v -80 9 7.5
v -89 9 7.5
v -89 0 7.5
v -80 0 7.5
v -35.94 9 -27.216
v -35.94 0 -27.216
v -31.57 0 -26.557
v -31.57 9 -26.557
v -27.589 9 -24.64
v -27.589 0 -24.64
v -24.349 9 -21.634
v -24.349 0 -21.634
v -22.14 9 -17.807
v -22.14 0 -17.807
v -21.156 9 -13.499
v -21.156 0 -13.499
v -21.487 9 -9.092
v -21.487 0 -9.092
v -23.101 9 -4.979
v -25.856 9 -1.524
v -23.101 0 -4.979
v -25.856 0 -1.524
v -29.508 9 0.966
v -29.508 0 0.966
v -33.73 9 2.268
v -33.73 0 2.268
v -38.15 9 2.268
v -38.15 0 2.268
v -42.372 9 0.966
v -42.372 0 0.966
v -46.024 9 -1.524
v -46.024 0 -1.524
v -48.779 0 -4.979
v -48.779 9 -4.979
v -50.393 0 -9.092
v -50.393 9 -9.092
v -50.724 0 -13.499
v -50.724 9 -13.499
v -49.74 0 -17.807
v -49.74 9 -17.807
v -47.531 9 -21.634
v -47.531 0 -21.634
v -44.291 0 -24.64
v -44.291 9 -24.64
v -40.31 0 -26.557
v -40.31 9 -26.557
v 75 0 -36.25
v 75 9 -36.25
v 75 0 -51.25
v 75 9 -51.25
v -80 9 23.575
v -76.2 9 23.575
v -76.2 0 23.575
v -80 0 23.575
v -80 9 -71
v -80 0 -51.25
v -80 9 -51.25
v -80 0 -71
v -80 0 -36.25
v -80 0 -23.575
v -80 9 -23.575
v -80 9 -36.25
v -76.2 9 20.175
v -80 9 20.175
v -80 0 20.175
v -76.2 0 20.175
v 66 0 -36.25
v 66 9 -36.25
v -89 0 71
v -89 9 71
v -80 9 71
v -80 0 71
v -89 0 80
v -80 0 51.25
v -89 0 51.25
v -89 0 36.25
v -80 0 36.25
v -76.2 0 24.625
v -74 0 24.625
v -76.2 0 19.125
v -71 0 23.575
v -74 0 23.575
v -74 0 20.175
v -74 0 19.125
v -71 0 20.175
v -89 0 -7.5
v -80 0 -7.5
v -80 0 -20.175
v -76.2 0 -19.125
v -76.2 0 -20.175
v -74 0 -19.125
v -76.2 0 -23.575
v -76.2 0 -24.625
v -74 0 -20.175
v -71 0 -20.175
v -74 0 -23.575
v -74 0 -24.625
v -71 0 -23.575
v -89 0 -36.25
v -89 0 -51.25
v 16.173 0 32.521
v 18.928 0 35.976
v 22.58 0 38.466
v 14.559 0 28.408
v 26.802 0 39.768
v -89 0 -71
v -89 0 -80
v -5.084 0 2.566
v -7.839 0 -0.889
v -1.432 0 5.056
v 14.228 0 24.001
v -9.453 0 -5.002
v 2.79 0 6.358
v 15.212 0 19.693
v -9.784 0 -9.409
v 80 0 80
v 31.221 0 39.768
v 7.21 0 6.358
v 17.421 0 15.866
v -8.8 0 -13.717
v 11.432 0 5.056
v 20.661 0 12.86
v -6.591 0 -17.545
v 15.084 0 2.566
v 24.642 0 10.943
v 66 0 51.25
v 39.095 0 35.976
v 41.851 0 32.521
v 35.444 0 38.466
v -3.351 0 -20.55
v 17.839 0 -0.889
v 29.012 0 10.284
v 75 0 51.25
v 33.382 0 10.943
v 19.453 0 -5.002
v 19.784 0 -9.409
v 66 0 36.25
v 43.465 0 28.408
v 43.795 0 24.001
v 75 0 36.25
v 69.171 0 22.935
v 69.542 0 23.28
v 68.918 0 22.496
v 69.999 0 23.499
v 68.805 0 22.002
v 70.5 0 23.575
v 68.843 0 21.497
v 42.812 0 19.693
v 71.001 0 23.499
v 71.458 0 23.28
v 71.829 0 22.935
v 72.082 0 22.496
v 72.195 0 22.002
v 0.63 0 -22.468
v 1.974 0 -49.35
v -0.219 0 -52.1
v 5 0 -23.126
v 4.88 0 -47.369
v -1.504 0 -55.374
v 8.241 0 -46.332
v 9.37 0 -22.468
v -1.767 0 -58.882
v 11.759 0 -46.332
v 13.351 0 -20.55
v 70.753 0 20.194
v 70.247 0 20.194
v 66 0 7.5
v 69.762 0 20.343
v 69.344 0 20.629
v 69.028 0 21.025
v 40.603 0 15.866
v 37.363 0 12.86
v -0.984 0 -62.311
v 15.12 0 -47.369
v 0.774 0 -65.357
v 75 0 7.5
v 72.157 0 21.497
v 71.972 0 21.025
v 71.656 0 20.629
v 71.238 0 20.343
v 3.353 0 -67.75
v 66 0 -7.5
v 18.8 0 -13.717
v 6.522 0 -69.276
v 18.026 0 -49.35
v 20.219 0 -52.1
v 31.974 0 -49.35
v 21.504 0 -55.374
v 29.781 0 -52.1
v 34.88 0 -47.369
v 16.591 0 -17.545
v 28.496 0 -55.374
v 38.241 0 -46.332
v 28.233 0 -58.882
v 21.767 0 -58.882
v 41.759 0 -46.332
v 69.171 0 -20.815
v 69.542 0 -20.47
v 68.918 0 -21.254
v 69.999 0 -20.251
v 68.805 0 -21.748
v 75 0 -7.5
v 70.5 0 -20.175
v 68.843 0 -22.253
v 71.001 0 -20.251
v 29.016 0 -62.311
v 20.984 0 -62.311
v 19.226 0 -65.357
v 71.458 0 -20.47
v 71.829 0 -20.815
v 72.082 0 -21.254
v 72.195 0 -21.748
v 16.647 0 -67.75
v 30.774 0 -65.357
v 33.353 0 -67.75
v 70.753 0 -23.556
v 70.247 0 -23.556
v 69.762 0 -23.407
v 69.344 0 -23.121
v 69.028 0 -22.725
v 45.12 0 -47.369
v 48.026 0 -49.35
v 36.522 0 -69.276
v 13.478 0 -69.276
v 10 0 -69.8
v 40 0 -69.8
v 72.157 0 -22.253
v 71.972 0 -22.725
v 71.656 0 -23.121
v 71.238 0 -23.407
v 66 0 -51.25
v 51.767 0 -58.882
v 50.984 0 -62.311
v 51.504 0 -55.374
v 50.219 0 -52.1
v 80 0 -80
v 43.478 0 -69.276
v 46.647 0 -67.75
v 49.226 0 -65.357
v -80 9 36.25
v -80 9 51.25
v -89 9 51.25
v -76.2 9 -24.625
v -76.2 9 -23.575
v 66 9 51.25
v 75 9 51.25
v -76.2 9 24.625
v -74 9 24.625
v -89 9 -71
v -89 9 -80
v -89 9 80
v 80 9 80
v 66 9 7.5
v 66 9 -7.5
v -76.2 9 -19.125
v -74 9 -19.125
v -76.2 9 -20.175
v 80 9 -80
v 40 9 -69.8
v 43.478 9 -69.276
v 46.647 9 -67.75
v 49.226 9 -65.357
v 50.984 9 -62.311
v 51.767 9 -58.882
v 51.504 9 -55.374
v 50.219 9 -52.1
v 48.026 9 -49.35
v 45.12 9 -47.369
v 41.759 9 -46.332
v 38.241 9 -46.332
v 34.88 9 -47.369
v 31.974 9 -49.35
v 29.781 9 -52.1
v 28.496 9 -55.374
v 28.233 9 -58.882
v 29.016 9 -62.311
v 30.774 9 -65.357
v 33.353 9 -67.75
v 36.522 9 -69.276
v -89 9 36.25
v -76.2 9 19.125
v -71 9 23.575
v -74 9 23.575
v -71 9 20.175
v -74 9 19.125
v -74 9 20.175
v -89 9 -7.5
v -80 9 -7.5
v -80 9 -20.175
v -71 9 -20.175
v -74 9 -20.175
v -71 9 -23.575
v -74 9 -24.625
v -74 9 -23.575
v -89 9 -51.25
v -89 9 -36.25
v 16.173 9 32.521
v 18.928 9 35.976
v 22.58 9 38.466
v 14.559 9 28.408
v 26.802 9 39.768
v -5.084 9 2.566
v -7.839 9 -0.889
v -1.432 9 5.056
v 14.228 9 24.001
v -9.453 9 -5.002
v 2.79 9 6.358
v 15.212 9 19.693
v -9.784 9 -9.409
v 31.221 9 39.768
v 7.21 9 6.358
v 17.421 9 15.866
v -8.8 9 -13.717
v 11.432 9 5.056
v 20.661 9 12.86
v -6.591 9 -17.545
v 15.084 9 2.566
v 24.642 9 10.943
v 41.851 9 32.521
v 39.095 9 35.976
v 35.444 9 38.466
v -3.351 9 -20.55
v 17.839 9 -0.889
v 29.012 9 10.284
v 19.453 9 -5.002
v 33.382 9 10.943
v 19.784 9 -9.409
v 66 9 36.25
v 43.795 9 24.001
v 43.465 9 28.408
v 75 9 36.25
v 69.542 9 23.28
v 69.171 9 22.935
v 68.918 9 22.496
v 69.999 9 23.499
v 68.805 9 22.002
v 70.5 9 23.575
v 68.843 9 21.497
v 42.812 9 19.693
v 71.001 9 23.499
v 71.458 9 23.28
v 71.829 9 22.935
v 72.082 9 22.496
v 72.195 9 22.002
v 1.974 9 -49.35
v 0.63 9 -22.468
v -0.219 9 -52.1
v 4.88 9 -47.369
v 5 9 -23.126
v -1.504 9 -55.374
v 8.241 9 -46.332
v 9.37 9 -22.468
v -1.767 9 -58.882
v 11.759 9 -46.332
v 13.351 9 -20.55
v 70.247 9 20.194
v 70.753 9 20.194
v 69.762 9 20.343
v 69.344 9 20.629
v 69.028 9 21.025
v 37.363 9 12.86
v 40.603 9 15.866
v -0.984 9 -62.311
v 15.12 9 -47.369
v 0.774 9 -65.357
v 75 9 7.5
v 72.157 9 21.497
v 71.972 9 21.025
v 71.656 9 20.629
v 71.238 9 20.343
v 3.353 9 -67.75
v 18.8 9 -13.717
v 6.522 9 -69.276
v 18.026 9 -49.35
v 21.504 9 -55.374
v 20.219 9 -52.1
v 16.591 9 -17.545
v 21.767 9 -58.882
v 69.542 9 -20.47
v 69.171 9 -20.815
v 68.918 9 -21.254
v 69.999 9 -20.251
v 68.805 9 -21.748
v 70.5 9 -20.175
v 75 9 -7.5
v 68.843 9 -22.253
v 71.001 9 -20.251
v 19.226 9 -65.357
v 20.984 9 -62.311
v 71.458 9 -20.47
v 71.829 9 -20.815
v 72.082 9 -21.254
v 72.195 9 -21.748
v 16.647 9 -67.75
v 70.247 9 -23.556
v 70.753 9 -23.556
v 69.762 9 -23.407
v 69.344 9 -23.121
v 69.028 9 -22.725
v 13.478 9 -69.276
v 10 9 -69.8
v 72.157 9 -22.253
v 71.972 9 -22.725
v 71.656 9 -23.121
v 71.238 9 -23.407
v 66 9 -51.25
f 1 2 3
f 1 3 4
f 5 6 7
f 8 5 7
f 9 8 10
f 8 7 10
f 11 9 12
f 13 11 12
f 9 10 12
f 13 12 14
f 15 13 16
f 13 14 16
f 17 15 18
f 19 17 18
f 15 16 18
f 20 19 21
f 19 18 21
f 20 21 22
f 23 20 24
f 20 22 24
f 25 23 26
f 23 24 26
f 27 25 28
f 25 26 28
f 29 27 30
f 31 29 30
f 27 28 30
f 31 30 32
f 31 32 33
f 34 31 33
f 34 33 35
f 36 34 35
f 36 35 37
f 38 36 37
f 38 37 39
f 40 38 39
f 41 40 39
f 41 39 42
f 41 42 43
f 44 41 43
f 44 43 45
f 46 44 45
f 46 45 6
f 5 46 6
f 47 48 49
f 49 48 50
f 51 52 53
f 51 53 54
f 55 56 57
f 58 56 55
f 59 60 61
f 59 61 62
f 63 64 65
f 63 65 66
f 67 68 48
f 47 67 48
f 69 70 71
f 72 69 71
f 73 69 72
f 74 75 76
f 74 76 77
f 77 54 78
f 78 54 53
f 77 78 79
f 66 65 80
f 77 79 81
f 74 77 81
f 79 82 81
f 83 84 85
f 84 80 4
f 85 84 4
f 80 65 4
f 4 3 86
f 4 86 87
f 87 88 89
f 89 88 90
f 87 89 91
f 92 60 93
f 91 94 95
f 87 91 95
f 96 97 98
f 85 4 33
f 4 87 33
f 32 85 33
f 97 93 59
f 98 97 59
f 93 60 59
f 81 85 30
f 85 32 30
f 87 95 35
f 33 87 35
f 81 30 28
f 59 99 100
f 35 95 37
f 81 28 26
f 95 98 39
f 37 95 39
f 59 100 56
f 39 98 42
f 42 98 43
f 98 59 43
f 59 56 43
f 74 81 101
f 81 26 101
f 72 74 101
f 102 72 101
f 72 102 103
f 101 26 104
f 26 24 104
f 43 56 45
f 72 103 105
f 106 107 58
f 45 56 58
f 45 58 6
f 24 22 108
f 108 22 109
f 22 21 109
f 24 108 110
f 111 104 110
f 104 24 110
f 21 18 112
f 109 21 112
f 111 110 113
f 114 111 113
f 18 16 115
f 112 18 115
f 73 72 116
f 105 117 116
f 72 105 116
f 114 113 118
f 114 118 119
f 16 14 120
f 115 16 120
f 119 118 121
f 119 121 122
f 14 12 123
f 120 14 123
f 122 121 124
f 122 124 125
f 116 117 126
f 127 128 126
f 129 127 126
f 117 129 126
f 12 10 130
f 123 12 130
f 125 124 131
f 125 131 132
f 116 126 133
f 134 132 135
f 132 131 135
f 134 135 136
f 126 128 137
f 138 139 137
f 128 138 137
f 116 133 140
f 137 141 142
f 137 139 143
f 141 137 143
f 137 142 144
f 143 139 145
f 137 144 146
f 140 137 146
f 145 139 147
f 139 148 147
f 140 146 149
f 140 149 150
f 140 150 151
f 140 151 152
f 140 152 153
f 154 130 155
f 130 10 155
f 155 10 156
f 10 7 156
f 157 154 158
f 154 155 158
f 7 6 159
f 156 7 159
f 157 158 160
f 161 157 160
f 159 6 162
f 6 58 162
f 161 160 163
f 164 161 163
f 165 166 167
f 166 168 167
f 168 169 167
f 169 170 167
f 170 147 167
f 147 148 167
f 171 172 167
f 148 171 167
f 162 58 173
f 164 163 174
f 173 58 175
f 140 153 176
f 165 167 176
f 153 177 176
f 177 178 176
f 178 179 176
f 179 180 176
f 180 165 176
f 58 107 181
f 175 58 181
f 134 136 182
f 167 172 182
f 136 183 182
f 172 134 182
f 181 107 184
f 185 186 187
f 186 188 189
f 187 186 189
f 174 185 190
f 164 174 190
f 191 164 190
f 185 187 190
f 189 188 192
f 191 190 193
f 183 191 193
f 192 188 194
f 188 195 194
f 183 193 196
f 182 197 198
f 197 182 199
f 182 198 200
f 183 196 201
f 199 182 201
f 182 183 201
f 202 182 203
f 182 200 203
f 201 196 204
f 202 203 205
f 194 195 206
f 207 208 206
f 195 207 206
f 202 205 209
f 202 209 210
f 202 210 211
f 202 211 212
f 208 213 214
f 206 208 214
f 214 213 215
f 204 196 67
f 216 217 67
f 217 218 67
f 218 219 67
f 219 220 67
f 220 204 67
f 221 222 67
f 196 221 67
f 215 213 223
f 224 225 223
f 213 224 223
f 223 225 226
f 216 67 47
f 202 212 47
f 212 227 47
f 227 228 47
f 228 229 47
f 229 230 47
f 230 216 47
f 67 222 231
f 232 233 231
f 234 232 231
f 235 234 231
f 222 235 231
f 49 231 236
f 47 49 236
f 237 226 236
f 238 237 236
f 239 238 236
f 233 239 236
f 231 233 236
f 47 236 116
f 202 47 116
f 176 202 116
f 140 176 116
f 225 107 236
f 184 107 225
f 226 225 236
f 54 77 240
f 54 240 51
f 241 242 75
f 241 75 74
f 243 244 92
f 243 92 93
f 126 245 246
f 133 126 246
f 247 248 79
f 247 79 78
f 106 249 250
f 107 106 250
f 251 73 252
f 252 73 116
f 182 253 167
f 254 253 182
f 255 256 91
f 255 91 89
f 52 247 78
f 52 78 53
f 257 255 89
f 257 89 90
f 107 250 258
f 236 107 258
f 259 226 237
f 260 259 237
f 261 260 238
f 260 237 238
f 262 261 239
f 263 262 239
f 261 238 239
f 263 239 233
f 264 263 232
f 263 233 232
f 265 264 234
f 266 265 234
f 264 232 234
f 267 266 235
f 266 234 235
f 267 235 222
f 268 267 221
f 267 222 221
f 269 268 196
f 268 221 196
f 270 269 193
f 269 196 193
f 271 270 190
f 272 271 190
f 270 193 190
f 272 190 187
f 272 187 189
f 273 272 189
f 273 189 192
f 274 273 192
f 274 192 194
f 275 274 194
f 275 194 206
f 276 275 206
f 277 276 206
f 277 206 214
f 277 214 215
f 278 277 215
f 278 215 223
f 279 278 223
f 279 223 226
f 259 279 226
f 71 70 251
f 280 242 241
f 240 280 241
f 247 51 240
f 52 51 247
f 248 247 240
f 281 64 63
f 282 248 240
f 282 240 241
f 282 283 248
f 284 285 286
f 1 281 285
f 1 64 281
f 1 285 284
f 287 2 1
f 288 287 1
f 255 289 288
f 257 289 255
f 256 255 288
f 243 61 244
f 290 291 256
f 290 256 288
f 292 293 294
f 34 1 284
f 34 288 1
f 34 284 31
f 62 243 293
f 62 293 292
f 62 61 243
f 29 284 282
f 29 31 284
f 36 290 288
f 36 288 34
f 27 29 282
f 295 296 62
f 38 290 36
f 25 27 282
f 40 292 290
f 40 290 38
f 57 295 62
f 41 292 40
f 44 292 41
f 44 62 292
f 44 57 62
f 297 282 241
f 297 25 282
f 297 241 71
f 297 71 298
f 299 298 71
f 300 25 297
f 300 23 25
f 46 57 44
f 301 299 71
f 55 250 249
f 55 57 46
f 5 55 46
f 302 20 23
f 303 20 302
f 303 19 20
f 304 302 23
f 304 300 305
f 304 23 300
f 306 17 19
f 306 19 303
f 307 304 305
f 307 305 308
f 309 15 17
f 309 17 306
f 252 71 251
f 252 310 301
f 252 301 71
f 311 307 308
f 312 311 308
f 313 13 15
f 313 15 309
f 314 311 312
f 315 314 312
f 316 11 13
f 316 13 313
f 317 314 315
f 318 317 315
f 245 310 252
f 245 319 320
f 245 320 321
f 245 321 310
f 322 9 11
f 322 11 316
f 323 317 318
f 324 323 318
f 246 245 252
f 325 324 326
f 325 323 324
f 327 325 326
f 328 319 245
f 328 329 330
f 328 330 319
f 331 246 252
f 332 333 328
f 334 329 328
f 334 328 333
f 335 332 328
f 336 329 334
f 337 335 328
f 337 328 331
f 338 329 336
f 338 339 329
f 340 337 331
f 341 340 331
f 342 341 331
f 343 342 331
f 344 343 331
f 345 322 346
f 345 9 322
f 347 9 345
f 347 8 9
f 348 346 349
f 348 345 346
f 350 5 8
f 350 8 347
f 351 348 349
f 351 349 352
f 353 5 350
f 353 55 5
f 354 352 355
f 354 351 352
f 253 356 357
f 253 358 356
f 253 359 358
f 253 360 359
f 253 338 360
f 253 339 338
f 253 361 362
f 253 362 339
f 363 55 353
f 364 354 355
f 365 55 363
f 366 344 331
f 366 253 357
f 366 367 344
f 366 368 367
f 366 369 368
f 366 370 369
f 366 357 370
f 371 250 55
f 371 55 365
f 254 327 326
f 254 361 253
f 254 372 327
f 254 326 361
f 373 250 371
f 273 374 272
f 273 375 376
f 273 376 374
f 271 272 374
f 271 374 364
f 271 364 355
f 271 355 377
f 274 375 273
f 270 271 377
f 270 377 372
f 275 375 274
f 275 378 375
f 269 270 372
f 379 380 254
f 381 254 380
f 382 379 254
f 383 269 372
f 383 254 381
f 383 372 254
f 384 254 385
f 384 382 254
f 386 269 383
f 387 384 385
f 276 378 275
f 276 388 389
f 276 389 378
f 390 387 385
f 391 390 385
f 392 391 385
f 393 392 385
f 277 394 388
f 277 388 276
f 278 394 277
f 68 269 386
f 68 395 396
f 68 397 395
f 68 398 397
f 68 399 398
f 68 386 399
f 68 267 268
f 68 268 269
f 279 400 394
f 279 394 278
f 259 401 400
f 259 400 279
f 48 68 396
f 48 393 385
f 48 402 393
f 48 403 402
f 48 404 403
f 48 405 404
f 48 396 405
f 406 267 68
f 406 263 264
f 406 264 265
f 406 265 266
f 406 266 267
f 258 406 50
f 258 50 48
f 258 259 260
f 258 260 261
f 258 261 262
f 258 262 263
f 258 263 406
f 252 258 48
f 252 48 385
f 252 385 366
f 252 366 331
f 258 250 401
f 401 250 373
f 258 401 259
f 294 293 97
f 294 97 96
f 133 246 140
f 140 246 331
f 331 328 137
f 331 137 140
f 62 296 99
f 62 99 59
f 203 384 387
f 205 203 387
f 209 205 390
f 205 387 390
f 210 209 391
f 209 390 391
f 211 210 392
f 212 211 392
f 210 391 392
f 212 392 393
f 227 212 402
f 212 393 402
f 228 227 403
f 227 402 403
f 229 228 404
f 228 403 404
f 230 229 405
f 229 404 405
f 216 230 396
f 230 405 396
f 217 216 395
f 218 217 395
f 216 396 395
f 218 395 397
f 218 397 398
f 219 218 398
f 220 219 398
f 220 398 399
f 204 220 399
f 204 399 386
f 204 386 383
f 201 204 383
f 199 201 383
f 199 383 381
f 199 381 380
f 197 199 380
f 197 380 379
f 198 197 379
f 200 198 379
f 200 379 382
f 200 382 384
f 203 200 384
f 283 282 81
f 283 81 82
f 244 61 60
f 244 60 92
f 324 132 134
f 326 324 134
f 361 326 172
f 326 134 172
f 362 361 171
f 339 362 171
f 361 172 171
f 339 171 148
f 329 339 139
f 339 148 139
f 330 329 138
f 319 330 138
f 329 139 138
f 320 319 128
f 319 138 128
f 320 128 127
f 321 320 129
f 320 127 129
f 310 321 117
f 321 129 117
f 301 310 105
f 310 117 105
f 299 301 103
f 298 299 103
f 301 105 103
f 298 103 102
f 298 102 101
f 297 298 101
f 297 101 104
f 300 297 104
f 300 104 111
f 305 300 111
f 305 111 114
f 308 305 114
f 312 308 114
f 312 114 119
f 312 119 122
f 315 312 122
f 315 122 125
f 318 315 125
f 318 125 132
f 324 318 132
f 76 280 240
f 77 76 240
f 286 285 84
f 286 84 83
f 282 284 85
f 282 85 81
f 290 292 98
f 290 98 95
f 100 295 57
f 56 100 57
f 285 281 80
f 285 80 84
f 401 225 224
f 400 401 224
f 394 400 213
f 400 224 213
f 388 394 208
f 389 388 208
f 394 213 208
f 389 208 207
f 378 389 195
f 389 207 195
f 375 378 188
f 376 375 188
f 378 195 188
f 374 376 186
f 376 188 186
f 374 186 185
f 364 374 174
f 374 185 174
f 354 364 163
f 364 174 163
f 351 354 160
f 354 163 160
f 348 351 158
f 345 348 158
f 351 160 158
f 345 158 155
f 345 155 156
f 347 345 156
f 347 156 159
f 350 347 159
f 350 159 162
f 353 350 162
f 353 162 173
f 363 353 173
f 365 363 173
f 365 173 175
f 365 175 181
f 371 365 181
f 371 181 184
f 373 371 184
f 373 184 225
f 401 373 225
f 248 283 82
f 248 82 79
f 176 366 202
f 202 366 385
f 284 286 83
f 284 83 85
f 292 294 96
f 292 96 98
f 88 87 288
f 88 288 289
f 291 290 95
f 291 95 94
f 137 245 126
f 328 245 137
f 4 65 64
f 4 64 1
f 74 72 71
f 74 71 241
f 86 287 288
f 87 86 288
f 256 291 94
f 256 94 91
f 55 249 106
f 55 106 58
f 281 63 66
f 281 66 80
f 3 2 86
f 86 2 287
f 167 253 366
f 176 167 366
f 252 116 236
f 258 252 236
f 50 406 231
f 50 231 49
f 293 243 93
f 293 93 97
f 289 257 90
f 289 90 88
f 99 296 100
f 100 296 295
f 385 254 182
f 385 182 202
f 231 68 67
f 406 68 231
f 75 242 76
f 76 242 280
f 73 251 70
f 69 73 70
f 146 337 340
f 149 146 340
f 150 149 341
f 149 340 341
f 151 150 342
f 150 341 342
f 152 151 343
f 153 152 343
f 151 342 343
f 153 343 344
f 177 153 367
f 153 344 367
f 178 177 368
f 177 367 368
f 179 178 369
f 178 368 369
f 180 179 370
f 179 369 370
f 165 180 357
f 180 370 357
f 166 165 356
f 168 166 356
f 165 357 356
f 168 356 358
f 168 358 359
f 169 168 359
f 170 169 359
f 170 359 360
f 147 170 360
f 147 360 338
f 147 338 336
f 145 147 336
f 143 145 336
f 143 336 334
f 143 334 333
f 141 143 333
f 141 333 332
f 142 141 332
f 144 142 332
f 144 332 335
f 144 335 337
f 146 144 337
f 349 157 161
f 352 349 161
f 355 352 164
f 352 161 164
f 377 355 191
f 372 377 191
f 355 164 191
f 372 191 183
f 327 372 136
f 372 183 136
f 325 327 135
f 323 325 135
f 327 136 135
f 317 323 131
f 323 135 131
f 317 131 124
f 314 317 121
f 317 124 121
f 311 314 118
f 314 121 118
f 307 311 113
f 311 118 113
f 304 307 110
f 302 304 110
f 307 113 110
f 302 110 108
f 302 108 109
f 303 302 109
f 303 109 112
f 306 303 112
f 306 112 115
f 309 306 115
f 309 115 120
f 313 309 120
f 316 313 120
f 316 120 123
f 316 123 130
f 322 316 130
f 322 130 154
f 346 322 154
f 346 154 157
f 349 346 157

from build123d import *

# Parameters (mm, degrees)
SKETCH1_W           = 160
SKETCH1_H           = 160
BOSS_EXTRUDE1_DEPTH = 9
SKETCH2_W           = 9
SKETCH2_H           = 15
SKETCH2_H_2         = 9
BOSS_EXTRUDE2_DEPTH = 9
SKETCH3_R           = 1.7
SKETCH3_W           = 9
SKETCH3_H           = 15
CUT_EXTRUDE1_DEPTH  = 121.008333044
CUT_EXTRUDE2_DEPTH  = 121.008333044
SKETCH5_R           = 14.825
SKETCH5_R_2         = 11.8
CUT_EXTRUDE3_DEPTH  = 121.008333044


with BuildPart() as part:
    # Sketch1 → Boss-Extrude1 (new body)
    with BuildSketch(Plane(origin=(0, 0, 0), x_dir=(1, 0, 0), z_dir=(0, 1, 0))):
        Rectangle(SKETCH1_W, SKETCH1_H)
    extrude(amount=BOSS_EXTRUDE1_DEPTH)

    # Sketch2 → Boss-Extrude2 (add)
    with BuildSketch(Plane(origin=(0, 9, 0), x_dir=(1, 0, 0), z_dir=(0, 1, 0))):
        with Locations((-84.5, 0)):
            Rectangle(SKETCH2_W, SKETCH2_H)
        with Locations((-84.5, 43.75)):
            Rectangle(SKETCH2_W, SKETCH2_H)
        with Locations((-84.5, -43.75)):
            Rectangle(SKETCH2_W, SKETCH2_H)
        with Locations((-84.5, 75.5)):
            Rectangle(SKETCH2_W, SKETCH2_H_2)
        with Locations((-84.5, -75.5)):
            Rectangle(SKETCH2_W, SKETCH2_H_2)
    extrude(amount=-BOSS_EXTRUDE2_DEPTH)

    # Sketch3 → Cut-Extrude1 (cut, through all)
    with BuildSketch(Plane(origin=(0, 9, 0), x_dir=(1, 0, 0), z_dir=(0, 1, 0))):
        with Locations(Location((70.5, 21.875, 0), (0, 0, 270))):
            Circle(SKETCH3_R)
        with Locations(Location((70.5, -21.875, 0), (0, 0, 270))):
            Circle(SKETCH3_R)
        with Locations((70.5, 43.75)):
            Rectangle(SKETCH3_W, SKETCH3_H)
        with Locations((70.5, 0)):
            Rectangle(SKETCH3_W, SKETCH3_H)
        with Locations((70.5, -43.75)):
            Rectangle(SKETCH3_W, SKETCH3_H)
    extrude(amount=-CUT_EXTRUDE1_DEPTH, mode=Mode.SUBTRACT)

    # Sketch4 → Cut-Extrude2 (cut, through all)
    with BuildSketch(Plane(origin=(0, 9, 0), x_dir=(1, 0, 0), z_dir=(0, 1, 0))):
        Polygon((-80, 23.575), (-76.2, 23.575), (-76.2, 24.625), (-74, 24.625), (-74, 23.575), (-71, 23.575), (-71, 20.175), (-74, 20.175), (-74, 19.125), (-76.2, 19.125), (-76.2, 20.175), (-80, 20.175), align=None)
        Polygon((-80, -23.575), (-80, -20.175), (-76.2, -20.175), (-76.2, -19.125), (-74, -19.125), (-74, -20.175), (-71, -20.175), (-71, -23.575), (-74, -23.575), (-74, -24.625), (-76.2, -24.625), (-76.2, -23.575), align=None)
    extrude(amount=-CUT_EXTRUDE2_DEPTH, mode=Mode.SUBTRACT)

    # Sketch5 → Cut-Extrude3 (cut, through all)
    with BuildSketch(Plane.XZ):
        with Locations(Location((29.011898336, 25.108901907, 0), (0, 0, 270))):
            Circle(SKETCH5_R)
        with Locations(Location((5, -8.301270189, 0), (0, 0, 270))):
            Circle(SKETCH5_R)
        with Locations(Location((-35.940006948, -12.391098093, 0), (0, 0, 270))):
            Circle(SKETCH5_R)
        with Locations(Location((40, -58, 0), (0, 0, 270))):
            Circle(SKETCH5_R_2)
        with Locations(Location((10, -58, 0), (0, 0, 270))):
            Circle(SKETCH5_R_2)
    extrude(amount=-CUT_EXTRUDE3_DEPTH, mode=Mode.SUBTRACT)


solid = part.part
